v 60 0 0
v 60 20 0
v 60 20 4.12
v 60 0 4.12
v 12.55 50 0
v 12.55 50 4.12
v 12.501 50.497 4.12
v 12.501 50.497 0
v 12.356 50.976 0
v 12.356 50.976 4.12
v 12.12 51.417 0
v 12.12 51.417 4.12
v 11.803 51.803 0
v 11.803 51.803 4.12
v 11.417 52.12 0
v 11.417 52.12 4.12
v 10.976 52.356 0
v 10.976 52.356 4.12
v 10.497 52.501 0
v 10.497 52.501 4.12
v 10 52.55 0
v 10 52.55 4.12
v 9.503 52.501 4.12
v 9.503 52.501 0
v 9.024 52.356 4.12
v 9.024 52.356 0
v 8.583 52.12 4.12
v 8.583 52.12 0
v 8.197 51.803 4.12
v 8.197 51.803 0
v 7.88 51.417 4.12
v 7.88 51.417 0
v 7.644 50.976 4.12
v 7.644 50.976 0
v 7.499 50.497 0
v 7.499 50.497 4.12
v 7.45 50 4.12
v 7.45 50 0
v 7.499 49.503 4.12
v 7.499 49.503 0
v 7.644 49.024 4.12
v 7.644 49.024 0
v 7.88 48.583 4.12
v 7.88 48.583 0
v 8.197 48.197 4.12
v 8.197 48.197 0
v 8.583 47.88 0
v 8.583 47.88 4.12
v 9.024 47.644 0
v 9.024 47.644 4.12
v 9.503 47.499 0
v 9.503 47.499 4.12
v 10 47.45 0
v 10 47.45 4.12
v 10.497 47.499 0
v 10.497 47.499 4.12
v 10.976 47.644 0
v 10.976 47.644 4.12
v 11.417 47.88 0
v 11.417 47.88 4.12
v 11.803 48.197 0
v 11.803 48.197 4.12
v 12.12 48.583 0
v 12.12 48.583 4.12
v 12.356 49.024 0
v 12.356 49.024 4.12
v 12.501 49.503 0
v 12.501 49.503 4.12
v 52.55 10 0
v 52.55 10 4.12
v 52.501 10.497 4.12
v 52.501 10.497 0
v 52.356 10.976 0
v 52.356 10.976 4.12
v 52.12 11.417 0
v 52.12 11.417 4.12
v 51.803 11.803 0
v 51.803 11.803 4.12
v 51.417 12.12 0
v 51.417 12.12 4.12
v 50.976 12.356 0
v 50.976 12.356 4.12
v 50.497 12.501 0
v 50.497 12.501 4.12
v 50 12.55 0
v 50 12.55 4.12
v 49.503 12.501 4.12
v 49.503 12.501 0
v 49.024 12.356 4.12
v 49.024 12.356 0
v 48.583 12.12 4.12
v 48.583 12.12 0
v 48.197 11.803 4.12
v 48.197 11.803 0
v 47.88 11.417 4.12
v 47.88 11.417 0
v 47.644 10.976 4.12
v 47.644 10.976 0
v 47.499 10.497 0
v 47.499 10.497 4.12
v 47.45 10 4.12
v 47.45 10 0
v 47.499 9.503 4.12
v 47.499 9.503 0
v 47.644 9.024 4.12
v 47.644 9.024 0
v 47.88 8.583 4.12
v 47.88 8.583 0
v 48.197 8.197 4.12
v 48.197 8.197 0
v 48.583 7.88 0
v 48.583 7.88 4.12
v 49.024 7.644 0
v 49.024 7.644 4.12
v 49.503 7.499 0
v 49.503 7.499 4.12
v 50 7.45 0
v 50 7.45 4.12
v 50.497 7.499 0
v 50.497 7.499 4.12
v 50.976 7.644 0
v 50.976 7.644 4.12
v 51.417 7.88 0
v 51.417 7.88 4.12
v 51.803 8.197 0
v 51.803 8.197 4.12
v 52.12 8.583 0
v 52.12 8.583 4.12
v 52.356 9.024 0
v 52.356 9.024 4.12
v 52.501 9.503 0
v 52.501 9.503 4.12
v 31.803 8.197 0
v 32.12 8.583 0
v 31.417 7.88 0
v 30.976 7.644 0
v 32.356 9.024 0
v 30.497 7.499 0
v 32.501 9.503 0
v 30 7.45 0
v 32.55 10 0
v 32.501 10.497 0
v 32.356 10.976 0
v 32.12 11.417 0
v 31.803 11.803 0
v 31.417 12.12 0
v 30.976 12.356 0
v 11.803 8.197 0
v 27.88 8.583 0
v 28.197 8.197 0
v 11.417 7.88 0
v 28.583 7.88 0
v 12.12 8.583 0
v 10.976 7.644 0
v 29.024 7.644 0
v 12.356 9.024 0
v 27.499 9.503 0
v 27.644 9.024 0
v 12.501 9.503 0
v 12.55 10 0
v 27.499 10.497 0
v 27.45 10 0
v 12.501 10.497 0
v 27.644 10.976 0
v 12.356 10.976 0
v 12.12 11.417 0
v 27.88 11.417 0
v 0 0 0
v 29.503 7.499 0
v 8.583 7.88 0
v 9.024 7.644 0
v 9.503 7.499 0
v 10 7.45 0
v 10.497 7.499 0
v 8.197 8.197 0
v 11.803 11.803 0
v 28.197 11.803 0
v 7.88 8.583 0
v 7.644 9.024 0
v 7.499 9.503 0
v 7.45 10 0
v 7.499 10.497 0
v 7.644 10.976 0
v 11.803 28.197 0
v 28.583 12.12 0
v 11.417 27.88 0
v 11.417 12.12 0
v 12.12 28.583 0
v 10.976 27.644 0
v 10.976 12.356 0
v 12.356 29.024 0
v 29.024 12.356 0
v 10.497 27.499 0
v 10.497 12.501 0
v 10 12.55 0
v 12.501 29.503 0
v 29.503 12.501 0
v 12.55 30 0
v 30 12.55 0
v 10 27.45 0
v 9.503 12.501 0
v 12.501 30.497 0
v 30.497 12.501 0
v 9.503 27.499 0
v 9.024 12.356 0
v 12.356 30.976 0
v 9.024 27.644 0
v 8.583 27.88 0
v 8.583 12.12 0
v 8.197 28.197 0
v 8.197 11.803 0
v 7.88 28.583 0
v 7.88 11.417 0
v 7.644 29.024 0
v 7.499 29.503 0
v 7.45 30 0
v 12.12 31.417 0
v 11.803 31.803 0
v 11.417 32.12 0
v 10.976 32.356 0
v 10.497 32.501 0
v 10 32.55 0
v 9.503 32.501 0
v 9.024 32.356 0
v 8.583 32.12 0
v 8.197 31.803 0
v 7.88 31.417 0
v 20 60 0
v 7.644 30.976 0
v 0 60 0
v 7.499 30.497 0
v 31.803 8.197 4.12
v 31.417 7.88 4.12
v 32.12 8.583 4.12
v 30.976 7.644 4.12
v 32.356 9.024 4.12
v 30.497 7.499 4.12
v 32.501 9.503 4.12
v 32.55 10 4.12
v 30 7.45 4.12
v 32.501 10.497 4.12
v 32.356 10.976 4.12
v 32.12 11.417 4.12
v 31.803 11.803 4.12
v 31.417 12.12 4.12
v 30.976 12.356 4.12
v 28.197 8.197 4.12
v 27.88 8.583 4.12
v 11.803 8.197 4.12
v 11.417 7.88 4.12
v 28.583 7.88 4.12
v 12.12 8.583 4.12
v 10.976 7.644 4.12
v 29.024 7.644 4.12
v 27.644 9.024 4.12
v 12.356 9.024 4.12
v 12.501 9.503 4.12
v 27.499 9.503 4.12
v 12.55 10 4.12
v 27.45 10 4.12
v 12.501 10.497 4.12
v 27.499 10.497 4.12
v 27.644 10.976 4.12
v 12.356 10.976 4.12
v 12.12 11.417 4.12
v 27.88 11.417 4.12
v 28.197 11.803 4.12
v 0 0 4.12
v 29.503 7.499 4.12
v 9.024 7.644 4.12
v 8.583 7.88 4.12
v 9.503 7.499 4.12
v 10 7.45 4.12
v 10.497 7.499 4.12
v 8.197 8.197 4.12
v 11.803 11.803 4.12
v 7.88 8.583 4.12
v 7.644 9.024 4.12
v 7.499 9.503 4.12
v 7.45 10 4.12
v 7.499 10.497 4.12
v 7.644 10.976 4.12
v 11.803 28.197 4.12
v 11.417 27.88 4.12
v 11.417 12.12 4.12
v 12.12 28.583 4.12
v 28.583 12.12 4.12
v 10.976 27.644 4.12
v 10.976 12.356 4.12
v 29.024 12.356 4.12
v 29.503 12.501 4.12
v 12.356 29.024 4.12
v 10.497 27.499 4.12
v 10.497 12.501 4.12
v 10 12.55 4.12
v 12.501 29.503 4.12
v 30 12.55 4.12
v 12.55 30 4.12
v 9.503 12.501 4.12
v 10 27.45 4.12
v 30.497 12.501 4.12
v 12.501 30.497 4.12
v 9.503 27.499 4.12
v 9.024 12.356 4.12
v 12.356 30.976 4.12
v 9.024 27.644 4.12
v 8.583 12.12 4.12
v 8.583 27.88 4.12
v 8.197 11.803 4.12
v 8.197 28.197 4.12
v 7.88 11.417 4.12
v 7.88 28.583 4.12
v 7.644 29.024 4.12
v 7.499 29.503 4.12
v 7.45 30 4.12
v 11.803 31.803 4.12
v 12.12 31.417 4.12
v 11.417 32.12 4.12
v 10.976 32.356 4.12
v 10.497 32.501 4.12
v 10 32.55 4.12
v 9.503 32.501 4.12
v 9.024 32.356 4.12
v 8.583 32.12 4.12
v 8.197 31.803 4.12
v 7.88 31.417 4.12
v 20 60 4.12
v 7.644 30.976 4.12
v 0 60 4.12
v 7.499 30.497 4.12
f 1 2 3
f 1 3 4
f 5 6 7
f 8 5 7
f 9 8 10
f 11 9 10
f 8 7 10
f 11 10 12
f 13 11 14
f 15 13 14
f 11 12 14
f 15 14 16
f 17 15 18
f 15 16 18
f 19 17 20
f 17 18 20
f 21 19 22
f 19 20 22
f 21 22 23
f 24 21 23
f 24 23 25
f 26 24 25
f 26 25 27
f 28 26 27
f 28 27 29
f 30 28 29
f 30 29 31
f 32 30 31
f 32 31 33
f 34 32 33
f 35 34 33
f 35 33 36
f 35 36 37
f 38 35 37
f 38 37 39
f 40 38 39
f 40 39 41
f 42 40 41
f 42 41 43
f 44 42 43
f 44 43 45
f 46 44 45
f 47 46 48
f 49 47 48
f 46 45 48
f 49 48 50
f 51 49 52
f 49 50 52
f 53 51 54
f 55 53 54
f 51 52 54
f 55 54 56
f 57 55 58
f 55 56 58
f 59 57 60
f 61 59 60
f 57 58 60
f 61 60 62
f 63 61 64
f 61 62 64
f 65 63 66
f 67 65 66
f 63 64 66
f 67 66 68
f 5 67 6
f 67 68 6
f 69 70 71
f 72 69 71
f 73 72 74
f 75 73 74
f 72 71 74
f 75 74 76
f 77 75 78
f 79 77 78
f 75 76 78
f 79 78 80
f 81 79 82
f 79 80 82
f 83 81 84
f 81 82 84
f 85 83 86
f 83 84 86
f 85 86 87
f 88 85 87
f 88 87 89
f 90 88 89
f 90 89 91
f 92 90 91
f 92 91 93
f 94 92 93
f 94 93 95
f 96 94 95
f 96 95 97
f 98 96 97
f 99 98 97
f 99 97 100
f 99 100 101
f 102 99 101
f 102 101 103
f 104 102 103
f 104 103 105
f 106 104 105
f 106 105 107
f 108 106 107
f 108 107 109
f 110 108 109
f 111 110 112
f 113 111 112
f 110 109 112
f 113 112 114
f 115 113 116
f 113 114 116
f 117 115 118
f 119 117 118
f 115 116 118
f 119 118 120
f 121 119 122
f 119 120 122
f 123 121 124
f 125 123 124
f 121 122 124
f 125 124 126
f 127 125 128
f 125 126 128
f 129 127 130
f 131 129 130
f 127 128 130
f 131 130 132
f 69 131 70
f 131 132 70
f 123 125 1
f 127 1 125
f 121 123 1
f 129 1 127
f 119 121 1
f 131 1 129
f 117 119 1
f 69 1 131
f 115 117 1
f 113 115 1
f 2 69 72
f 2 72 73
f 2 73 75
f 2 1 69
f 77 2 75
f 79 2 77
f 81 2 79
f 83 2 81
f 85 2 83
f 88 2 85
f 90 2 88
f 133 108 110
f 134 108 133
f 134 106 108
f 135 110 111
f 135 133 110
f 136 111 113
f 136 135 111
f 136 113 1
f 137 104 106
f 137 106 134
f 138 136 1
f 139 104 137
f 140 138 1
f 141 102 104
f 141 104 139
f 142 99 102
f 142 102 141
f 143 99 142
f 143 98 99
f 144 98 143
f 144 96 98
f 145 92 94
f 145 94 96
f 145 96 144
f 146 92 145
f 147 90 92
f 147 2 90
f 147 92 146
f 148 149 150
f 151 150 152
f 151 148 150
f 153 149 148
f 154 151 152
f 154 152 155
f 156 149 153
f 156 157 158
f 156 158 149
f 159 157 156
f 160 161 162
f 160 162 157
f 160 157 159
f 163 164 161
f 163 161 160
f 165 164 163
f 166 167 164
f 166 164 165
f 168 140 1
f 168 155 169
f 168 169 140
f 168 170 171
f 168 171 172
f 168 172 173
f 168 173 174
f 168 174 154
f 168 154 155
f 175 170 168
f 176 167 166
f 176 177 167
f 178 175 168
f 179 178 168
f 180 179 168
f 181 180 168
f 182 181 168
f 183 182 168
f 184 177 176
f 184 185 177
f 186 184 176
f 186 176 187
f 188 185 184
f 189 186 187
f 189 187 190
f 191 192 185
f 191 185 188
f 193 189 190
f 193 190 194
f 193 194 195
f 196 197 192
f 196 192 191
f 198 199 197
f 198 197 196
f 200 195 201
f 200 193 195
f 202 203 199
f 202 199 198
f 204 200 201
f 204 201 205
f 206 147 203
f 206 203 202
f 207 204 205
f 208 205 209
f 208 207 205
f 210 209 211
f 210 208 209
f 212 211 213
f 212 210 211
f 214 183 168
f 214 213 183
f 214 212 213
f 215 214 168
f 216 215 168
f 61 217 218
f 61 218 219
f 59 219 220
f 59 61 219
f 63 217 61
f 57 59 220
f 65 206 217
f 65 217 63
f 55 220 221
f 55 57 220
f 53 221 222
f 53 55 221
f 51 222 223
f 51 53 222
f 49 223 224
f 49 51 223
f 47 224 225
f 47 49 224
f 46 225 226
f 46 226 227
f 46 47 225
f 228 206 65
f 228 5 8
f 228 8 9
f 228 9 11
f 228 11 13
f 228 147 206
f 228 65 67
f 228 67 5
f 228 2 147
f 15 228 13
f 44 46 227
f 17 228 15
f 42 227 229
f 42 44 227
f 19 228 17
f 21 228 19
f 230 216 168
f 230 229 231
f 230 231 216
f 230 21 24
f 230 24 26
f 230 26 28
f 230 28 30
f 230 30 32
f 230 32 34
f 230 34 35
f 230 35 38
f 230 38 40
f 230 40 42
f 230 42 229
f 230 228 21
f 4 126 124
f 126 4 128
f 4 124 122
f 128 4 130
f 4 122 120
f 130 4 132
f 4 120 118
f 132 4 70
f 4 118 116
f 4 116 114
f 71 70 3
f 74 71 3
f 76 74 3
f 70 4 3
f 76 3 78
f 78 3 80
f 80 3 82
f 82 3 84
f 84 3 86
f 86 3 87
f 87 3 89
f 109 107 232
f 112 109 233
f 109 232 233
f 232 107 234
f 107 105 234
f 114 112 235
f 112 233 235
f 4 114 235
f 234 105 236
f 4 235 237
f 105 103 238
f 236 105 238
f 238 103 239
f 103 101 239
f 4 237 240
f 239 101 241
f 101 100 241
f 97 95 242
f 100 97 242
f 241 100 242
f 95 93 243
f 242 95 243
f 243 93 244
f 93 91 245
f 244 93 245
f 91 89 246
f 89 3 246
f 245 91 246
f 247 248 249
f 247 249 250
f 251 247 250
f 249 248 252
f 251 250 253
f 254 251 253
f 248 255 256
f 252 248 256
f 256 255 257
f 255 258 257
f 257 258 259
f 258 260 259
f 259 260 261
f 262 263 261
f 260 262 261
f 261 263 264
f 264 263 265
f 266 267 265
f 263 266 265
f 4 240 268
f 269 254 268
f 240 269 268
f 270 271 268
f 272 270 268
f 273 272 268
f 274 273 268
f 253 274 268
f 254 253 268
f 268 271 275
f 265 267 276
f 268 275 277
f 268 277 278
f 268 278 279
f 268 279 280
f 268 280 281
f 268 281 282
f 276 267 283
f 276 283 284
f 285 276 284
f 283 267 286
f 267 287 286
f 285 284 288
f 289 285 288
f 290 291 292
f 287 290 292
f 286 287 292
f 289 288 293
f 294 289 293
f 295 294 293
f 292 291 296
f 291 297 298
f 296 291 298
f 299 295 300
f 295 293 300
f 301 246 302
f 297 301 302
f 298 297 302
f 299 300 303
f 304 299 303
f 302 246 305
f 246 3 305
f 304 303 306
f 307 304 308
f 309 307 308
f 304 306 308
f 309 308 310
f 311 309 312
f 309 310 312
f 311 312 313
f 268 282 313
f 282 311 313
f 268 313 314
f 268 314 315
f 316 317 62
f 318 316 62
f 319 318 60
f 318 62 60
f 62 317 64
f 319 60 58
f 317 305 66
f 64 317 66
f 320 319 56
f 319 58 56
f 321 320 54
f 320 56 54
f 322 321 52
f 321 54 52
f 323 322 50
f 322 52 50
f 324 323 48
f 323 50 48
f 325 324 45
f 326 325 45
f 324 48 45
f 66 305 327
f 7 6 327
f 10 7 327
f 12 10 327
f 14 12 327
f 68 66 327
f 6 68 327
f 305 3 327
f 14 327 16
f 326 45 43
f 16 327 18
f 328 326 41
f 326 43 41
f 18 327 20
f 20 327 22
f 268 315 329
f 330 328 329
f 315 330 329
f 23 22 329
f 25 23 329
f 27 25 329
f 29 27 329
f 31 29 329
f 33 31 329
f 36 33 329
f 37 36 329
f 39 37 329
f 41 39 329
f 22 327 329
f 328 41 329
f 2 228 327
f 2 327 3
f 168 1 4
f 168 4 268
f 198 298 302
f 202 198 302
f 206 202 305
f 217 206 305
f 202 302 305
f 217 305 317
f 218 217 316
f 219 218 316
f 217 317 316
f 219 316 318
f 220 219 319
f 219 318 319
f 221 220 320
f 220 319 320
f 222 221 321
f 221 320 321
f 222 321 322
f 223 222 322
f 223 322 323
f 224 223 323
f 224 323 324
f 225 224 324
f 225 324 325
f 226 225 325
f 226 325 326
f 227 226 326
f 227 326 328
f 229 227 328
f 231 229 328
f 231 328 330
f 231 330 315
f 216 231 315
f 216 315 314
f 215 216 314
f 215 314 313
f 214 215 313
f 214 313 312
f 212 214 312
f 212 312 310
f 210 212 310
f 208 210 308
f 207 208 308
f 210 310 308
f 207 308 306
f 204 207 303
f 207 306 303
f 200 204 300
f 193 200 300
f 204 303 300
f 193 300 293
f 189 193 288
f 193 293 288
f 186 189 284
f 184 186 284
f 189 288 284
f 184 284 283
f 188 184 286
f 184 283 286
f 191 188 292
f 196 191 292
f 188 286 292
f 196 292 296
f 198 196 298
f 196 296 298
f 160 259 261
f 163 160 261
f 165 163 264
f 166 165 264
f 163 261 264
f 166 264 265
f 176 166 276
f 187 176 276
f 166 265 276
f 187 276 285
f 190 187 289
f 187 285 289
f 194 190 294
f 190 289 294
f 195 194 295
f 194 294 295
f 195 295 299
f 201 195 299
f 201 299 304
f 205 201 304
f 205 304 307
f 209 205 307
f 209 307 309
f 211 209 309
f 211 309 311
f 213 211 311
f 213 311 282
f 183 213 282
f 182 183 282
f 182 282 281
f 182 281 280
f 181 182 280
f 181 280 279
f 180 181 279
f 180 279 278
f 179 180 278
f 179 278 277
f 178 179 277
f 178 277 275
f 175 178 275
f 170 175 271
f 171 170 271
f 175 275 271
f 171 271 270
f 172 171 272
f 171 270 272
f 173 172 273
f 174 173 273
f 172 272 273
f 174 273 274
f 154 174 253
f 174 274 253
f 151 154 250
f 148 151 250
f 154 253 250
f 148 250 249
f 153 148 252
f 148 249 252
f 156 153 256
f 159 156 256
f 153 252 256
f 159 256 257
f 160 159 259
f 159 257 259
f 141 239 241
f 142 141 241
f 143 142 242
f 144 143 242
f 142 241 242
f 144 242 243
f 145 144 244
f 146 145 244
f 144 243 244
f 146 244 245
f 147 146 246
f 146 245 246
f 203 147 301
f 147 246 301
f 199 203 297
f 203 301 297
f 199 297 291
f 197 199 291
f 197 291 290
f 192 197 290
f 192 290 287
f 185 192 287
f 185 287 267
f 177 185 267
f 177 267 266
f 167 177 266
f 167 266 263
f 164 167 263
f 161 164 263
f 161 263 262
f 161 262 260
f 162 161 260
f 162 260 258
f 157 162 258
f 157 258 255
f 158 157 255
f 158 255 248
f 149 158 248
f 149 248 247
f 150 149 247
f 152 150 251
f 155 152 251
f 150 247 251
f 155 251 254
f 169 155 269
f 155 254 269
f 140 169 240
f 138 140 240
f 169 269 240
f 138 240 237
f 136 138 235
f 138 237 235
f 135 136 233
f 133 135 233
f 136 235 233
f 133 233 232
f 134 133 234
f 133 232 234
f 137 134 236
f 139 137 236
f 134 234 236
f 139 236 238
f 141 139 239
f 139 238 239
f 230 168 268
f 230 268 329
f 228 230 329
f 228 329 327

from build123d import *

# Parameters (mm, degrees)
BOSS_EXTRUDE1_DEPTH = 4.12
SKETCH2_R           = 2.55
CUT_EXTRUDE1_DEPTH  = 5.12


with BuildPart() as part:
    # Sketch1 → Boss-Extrude1 (new body)
    with BuildSketch(Plane.XY):
        Polygon((0, 0), (0, 60), (20, 60), (60, 20), (60, 0), align=None)
    extrude(amount=BOSS_EXTRUDE1_DEPTH)

    # Sketch2 → Cut-Extrude1 (cut, through all)
    with BuildSketch(Plane.XY.offset(4.12)):
        with Locations((10, 10)):
            Circle(SKETCH2_R)
        with Locations((30, 10)):
            Circle(SKETCH2_R)
        with Locations((50, 10)):
            Circle(SKETCH2_R)
        with Locations((10, 30)):
            Circle(SKETCH2_R)
        with Locations((10, 50)):
            Circle(SKETCH2_R)
    extrude(amount=-CUT_EXTRUDE1_DEPTH, mode=Mode.SUBTRACT)


solid = part.part
